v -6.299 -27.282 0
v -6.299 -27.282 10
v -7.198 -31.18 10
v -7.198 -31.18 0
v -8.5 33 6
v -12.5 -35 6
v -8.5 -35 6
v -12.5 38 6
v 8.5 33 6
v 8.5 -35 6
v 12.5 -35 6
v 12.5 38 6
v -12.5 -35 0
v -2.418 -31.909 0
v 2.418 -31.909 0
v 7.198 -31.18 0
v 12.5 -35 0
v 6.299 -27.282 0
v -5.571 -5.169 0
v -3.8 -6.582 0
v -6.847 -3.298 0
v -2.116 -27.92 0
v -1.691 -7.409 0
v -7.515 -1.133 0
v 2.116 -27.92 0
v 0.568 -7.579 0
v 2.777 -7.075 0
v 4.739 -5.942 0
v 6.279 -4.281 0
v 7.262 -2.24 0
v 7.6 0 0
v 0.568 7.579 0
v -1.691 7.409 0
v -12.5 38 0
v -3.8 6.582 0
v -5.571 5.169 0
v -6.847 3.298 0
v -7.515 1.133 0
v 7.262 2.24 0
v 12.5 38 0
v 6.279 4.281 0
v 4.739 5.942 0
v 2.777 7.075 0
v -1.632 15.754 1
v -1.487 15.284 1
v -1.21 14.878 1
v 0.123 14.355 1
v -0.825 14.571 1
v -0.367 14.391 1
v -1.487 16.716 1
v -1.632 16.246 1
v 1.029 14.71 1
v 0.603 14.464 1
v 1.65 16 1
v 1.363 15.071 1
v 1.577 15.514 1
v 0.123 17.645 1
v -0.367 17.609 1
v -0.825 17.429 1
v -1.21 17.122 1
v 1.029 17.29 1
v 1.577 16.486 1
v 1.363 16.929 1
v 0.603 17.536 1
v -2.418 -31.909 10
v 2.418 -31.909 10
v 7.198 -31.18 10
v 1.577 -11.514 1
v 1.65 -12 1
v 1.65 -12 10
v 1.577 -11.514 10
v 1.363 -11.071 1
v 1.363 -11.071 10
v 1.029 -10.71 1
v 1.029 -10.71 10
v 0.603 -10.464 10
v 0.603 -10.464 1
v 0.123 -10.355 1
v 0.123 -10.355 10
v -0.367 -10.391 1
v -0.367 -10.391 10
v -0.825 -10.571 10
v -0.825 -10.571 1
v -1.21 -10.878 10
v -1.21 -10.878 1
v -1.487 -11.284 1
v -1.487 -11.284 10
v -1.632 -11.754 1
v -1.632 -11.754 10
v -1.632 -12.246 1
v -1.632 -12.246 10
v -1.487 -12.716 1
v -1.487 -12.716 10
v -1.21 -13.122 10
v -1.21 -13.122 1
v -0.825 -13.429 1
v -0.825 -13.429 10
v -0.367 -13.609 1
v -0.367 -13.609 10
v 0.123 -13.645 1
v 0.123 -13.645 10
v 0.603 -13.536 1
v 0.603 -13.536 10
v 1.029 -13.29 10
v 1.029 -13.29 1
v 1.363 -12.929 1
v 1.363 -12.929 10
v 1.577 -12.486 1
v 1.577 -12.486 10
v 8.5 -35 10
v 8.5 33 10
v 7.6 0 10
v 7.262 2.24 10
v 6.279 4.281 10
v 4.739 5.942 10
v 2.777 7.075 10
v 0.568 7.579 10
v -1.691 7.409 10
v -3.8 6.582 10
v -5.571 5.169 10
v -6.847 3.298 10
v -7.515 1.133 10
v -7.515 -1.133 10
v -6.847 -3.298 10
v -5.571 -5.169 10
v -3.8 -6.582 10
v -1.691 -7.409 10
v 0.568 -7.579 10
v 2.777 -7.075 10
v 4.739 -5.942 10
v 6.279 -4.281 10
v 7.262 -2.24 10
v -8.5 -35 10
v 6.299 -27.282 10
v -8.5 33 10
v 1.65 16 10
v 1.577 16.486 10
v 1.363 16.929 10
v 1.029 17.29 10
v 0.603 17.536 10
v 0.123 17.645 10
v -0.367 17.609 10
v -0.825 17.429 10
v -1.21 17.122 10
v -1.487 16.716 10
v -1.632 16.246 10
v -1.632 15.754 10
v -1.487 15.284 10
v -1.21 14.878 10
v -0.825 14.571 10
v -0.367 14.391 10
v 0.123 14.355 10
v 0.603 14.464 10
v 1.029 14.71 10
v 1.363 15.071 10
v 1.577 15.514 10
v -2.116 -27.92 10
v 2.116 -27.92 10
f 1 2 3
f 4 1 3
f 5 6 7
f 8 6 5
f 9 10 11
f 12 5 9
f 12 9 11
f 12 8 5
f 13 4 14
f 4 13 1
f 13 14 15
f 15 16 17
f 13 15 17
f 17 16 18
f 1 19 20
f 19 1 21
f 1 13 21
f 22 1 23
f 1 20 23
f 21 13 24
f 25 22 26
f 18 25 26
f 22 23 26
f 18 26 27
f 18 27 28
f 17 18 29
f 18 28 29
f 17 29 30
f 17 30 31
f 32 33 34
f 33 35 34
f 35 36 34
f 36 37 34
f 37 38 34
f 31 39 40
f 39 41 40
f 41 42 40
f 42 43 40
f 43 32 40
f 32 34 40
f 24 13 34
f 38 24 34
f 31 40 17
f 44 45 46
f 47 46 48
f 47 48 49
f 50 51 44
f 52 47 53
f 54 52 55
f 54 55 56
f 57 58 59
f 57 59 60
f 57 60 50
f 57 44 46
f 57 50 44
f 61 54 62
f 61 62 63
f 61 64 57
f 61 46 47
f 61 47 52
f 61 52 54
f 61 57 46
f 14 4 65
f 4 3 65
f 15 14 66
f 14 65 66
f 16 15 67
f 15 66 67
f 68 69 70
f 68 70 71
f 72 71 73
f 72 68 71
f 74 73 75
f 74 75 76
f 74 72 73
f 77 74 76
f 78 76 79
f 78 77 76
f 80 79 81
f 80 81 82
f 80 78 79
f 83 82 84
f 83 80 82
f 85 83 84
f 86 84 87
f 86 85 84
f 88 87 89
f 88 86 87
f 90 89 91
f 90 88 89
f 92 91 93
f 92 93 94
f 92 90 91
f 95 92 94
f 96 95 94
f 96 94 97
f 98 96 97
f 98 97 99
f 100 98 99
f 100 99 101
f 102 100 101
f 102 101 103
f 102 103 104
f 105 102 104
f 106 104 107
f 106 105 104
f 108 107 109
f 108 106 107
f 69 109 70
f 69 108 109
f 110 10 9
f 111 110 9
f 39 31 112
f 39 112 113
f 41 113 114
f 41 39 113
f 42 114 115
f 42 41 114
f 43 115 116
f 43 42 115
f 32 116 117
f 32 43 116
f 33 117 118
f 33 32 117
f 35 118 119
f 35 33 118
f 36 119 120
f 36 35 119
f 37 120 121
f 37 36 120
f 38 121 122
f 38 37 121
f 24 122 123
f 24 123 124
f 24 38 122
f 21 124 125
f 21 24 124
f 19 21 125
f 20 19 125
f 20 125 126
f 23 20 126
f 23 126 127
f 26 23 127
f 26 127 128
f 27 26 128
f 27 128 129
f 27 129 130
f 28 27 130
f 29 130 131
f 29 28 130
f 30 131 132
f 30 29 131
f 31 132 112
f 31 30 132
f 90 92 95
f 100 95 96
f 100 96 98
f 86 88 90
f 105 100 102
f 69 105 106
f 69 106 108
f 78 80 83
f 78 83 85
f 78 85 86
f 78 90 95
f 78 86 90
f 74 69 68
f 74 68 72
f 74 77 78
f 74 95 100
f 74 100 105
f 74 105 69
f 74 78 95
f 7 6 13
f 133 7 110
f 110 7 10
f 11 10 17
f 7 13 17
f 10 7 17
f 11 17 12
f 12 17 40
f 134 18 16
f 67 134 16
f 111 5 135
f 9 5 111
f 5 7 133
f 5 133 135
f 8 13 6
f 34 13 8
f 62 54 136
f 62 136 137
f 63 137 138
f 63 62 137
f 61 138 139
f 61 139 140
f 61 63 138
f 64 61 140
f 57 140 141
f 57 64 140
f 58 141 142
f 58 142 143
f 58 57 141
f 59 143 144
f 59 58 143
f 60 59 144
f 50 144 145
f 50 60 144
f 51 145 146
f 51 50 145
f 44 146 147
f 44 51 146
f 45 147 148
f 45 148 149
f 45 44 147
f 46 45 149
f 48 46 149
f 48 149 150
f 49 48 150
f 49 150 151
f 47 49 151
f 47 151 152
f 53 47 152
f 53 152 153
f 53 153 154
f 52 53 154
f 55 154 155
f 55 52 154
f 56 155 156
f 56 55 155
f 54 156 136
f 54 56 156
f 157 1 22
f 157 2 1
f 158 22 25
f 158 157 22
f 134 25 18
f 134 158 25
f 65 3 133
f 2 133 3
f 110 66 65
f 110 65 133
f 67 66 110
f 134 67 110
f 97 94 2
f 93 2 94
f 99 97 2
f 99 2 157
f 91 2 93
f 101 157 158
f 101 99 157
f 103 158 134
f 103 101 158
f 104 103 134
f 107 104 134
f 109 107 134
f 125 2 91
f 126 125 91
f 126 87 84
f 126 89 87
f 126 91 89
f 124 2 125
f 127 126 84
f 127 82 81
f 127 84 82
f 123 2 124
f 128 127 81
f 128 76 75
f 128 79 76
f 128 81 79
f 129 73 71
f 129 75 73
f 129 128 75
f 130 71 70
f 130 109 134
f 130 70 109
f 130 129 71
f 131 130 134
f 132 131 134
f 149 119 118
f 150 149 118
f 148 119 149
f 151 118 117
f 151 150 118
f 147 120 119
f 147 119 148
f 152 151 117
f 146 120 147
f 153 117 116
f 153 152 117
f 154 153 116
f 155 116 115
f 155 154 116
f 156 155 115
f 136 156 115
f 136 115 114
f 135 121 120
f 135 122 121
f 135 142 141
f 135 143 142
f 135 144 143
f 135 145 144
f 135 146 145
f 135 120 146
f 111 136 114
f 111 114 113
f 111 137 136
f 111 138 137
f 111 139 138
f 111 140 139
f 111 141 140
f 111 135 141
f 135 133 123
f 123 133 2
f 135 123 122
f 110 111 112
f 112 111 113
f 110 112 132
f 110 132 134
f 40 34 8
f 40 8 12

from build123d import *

# Parameters (mm, degrees)
BOX003_W                    = 25
BOX003_H                    = 5
BOX003_DEPTH                = 6
CYLINDER_R                  = 7.6
CYLINDER_DEPTH              = 10
CYLINDER004_R               = 1.65
CYLINDER004_DEPTH           = 9
CYLINDER005_R               = 1.65
CYLINDER005_DEPTH           = 9
BOX_W                       = 4
BOX_H                       = 68
BOX_DEPTH                   = 4
BOX002_W                    = 4
BOX002_H                    = 68
BOX002_DEPTH                = 4
CYLINDER003_W               = 28
CYLINDER003_H               = 10
CYLINDER003_ANGLE           = 26
CYLINDER003_PLACEMENT_ANGLE = 103
CYLINDER002_W               = 32
CYLINDER002_H               = 10
CYLINDER002_ANGLE           = 26
CYLINDER002_PLACEMENT_ANGLE = 103
BOX001_W                    = 25
BOX001_H                    = 68
BOX001_DEPTH                = 10


with BuildPart() as w_rfel:
    # Box003 → Box003 (new body)
    with BuildSketch(Plane(origin=(-12.5, 33, 0), x_dir=(1, 0, 0), z_dir=(0, 0, 1))):
        with Locations((12.5, 2.5)):
            Rectangle(BOX003_W, BOX003_H)
    extrude(amount=BOX003_DEPTH)


with BuildPart() as zylinder:
    # Cylinder → Cylinder (new body)
    with BuildSketch(Plane.XY):
        Circle(CYLINDER_R)
    extrude(amount=CYLINDER_DEPTH)


with BuildPart() as zylinder003:
    # Cylinder004 → Cylinder004 (new body)
    with BuildSketch(Plane(origin=(0, -12, 1), x_dir=(1, 0, 0), z_dir=(0, 0, 1))):
        Circle(CYLINDER004_R)
    extrude(amount=CYLINDER004_DEPTH)


with BuildPart() as zylinder004:
    # Cylinder005 → Cylinder005 (new body)
    with BuildSketch(Plane(origin=(0, 16, 1), x_dir=(1, 0, 0), z_dir=(0, 0, 1))):
        Circle(CYLINDER005_R)
    extrude(amount=CYLINDER005_DEPTH)


with BuildPart() as w_rfel002:
    # Box → Box (new body)
    with BuildSketch(Plane(origin=(8.5, -35, 6), x_dir=(1, 0, 0), z_dir=(0, 0, 1))):
        with Locations((2, 34)):
            Rectangle(BOX_W, BOX_H)
    extrude(amount=BOX_DEPTH)


with BuildPart() as w_rfel003:
    # Box002 → Box002 (new body)
    with BuildSketch(Plane(origin=(-12.5, -35, 6), x_dir=(1, 0, 0), z_dir=(0, 0, 1))):
        with Locations((2, 34)):
            Rectangle(BOX002_W, BOX002_H)
    extrude(amount=BOX002_DEPTH)


with BuildPart() as zylinder002:
    # Cylinder003 → Cylinder003 (revolve)
    with BuildSketch(Plane.XZ):
        with Locations((14, 5)):
            Rectangle(CYLINDER003_W, CYLINDER003_H)
    revolve(axis=Axis((0, 0, 0), (0, 0, 1)), revolution_arc=CYLINDER003_ANGLE)


with BuildPart() as zylinder002_1:
    # Cylinder003 placement: moved
    add(zylinder002.part.rotate(Axis((0, 0, 0), (0, 0, -1)), CYLINDER003_PLACEMENT_ANGLE))


with BuildPart() as fusion:
    # Cylinder002 → Cylinder002 (revolve)
    with BuildSketch(Plane.XZ):
        with Locations((16, 5)):
            Rectangle(CYLINDER002_W, CYLINDER002_H)
    revolve(axis=Axis((0, 0, 0), (0, 0, 1)), revolution_arc=CYLINDER002_ANGLE)


with BuildPart() as fusion_1:
    # Cylinder002 placement: moved
    add(fusion.part.rotate(Axis((0, 0, 0), (0, 0, -1)), CYLINDER002_PLACEMENT_ANGLE))

    # Cut001: cut Zylinder002
    add(zylinder002_1.part, mode=Mode.SUBTRACT)

    # Fusion: union Zylinder, Zylinder003, Zylinder004, Würfel002, Würfel003
    add(zylinder.part)
    add(zylinder003.part)
    add(zylinder004.part)
    add(w_rfel002.part)
    add(w_rfel003.part)


with BuildPart() as fusion001:
    # Box001 → Box001 (new body)
    with BuildSketch(Plane(origin=(-12.5, -35, 0), x_dir=(1, 0, 0), z_dir=(0, 0, 1))):
        with Locations((12.5, 34)):
            Rectangle(BOX001_W, BOX001_H)
    extrude(amount=BOX001_DEPTH)

    # Cut: cut Fusion
    add(fusion_1.part, mode=Mode.SUBTRACT)

    # Fusion001: union Würfel
    add(w_rfel.part)


solid = fusion001.part
